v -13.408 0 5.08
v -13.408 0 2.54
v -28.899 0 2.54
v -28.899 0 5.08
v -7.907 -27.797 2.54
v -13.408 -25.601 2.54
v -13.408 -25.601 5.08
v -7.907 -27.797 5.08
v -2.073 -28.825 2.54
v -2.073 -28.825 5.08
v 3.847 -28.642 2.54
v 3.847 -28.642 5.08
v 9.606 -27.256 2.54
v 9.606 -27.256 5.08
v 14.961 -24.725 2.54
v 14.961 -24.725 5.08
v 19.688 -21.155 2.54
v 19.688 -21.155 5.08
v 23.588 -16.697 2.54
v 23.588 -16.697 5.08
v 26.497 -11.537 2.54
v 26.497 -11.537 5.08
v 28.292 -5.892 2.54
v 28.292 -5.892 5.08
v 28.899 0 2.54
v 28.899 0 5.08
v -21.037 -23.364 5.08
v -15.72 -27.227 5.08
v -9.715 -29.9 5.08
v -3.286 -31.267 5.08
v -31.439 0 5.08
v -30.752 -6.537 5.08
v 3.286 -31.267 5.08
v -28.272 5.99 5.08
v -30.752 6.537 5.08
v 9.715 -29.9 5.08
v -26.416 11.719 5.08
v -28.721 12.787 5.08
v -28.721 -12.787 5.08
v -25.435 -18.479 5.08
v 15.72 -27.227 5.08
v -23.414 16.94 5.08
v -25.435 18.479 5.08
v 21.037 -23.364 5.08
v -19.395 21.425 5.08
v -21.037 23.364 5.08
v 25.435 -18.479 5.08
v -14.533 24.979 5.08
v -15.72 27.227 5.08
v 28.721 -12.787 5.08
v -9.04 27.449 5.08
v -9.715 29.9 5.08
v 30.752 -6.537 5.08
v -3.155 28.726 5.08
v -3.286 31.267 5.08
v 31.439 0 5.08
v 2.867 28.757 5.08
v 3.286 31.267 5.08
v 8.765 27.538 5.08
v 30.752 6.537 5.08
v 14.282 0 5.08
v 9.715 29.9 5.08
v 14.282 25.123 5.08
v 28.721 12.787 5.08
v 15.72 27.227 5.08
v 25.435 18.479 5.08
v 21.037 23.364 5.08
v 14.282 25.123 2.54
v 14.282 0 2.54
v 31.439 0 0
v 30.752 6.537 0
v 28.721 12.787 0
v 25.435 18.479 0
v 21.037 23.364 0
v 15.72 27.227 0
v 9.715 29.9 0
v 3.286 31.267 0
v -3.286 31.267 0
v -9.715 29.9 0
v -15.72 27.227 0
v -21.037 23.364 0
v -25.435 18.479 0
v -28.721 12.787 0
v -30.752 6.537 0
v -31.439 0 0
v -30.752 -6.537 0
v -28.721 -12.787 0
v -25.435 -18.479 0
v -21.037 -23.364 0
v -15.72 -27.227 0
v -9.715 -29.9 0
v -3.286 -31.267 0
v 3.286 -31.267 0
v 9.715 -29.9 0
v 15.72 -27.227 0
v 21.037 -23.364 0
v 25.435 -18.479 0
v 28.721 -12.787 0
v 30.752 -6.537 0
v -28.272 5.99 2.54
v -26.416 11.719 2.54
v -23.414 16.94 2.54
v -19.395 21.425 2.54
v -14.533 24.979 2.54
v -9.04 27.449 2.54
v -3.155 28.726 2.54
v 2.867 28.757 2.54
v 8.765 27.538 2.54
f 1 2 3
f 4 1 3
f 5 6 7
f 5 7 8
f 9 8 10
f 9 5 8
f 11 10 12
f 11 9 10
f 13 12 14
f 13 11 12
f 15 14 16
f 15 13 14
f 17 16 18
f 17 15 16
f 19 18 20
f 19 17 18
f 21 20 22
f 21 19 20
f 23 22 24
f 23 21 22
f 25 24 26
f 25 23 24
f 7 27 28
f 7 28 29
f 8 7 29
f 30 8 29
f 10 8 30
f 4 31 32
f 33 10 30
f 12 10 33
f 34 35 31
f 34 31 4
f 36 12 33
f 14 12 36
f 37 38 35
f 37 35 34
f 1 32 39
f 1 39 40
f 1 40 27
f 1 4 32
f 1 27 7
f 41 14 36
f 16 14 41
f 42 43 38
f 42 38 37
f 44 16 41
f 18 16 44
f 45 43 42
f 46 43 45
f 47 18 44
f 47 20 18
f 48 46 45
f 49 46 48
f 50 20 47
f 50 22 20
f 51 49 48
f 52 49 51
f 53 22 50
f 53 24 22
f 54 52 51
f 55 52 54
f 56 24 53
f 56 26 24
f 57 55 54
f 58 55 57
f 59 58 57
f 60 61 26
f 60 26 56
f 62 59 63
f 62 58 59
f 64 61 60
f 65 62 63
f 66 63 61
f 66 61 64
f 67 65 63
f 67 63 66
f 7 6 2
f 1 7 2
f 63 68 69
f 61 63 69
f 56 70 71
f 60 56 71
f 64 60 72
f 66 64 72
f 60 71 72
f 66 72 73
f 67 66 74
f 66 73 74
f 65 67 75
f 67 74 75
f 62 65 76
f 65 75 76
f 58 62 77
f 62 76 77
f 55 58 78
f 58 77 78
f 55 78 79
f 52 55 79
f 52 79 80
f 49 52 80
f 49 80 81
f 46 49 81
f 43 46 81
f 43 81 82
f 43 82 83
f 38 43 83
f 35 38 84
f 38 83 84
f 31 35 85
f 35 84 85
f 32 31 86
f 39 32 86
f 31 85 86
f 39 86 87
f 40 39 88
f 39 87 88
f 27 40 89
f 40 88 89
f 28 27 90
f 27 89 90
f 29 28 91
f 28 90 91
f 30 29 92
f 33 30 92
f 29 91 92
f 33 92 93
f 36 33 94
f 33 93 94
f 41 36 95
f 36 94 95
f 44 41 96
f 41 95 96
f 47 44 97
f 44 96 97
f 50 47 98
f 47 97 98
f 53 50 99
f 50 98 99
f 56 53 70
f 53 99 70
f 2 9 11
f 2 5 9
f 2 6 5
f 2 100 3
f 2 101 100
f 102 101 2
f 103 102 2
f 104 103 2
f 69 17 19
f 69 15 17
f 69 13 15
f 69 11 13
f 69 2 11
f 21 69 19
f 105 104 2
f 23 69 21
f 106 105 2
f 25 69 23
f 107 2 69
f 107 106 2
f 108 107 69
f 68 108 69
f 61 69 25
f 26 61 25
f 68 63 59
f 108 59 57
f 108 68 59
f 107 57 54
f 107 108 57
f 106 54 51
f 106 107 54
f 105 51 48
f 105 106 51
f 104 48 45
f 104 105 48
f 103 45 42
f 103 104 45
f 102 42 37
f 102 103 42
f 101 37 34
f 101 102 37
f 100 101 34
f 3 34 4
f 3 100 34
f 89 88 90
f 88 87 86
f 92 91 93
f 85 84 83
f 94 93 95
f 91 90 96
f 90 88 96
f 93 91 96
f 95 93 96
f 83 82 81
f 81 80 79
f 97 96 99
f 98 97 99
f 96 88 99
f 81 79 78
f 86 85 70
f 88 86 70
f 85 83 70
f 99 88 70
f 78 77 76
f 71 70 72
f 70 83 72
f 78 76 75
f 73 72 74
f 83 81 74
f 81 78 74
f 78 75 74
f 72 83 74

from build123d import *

# Parameters (mm, degrees)
F0_R     = 31.4391719437
F1_DEPTH = 5.08
F2_T     = -2.54
F4_DEPTH = 2.54


# Not quite as in the source:
# - a feature names something its author has since deleted; it is built from what else it names


with BuildPart() as f1:
    # F0 (on Top) → F1 (new body)
    with BuildSketch(Plane.XY):
        Circle(F0_R)
    extrude(amount=F1_DEPTH)

    # F2
    f2_openings = [f1.faces().sort_by_distance(p)[0] for p in [
        (0, 0, 5.08),
    ]]
    offset(amount=F2_T, openings=f2_openings)

    # F3 (on face) → F4 (join)
    with BuildSketch(Plane.XY.offset(2.54)):
        with BuildLine():
            Line((-13.4078683332, 0), (-28.8991719437, 0))
            ThreePointArc((-28.8991719437, 0), (-24.7248703878, -14.9613810638), (-13.4078683332, -25.6006094808))
            Line((-13.4078683332, -25.6006094808), (-13.4078683332, 0))
        make_face()
        with BuildLine():
            ThreePointArc((28.8991719437, 0), (24.9790772251, 14.5329914336), (14.2822936177, 25.1232606969))
            Line((14.2822936177, 25.1232606969), (14.2822936177, 0))
            Line((14.2822936177, 0), (28.8991719437, 0))
        make_face()
    extrude(amount=F4_DEPTH)


solid = f1.part
